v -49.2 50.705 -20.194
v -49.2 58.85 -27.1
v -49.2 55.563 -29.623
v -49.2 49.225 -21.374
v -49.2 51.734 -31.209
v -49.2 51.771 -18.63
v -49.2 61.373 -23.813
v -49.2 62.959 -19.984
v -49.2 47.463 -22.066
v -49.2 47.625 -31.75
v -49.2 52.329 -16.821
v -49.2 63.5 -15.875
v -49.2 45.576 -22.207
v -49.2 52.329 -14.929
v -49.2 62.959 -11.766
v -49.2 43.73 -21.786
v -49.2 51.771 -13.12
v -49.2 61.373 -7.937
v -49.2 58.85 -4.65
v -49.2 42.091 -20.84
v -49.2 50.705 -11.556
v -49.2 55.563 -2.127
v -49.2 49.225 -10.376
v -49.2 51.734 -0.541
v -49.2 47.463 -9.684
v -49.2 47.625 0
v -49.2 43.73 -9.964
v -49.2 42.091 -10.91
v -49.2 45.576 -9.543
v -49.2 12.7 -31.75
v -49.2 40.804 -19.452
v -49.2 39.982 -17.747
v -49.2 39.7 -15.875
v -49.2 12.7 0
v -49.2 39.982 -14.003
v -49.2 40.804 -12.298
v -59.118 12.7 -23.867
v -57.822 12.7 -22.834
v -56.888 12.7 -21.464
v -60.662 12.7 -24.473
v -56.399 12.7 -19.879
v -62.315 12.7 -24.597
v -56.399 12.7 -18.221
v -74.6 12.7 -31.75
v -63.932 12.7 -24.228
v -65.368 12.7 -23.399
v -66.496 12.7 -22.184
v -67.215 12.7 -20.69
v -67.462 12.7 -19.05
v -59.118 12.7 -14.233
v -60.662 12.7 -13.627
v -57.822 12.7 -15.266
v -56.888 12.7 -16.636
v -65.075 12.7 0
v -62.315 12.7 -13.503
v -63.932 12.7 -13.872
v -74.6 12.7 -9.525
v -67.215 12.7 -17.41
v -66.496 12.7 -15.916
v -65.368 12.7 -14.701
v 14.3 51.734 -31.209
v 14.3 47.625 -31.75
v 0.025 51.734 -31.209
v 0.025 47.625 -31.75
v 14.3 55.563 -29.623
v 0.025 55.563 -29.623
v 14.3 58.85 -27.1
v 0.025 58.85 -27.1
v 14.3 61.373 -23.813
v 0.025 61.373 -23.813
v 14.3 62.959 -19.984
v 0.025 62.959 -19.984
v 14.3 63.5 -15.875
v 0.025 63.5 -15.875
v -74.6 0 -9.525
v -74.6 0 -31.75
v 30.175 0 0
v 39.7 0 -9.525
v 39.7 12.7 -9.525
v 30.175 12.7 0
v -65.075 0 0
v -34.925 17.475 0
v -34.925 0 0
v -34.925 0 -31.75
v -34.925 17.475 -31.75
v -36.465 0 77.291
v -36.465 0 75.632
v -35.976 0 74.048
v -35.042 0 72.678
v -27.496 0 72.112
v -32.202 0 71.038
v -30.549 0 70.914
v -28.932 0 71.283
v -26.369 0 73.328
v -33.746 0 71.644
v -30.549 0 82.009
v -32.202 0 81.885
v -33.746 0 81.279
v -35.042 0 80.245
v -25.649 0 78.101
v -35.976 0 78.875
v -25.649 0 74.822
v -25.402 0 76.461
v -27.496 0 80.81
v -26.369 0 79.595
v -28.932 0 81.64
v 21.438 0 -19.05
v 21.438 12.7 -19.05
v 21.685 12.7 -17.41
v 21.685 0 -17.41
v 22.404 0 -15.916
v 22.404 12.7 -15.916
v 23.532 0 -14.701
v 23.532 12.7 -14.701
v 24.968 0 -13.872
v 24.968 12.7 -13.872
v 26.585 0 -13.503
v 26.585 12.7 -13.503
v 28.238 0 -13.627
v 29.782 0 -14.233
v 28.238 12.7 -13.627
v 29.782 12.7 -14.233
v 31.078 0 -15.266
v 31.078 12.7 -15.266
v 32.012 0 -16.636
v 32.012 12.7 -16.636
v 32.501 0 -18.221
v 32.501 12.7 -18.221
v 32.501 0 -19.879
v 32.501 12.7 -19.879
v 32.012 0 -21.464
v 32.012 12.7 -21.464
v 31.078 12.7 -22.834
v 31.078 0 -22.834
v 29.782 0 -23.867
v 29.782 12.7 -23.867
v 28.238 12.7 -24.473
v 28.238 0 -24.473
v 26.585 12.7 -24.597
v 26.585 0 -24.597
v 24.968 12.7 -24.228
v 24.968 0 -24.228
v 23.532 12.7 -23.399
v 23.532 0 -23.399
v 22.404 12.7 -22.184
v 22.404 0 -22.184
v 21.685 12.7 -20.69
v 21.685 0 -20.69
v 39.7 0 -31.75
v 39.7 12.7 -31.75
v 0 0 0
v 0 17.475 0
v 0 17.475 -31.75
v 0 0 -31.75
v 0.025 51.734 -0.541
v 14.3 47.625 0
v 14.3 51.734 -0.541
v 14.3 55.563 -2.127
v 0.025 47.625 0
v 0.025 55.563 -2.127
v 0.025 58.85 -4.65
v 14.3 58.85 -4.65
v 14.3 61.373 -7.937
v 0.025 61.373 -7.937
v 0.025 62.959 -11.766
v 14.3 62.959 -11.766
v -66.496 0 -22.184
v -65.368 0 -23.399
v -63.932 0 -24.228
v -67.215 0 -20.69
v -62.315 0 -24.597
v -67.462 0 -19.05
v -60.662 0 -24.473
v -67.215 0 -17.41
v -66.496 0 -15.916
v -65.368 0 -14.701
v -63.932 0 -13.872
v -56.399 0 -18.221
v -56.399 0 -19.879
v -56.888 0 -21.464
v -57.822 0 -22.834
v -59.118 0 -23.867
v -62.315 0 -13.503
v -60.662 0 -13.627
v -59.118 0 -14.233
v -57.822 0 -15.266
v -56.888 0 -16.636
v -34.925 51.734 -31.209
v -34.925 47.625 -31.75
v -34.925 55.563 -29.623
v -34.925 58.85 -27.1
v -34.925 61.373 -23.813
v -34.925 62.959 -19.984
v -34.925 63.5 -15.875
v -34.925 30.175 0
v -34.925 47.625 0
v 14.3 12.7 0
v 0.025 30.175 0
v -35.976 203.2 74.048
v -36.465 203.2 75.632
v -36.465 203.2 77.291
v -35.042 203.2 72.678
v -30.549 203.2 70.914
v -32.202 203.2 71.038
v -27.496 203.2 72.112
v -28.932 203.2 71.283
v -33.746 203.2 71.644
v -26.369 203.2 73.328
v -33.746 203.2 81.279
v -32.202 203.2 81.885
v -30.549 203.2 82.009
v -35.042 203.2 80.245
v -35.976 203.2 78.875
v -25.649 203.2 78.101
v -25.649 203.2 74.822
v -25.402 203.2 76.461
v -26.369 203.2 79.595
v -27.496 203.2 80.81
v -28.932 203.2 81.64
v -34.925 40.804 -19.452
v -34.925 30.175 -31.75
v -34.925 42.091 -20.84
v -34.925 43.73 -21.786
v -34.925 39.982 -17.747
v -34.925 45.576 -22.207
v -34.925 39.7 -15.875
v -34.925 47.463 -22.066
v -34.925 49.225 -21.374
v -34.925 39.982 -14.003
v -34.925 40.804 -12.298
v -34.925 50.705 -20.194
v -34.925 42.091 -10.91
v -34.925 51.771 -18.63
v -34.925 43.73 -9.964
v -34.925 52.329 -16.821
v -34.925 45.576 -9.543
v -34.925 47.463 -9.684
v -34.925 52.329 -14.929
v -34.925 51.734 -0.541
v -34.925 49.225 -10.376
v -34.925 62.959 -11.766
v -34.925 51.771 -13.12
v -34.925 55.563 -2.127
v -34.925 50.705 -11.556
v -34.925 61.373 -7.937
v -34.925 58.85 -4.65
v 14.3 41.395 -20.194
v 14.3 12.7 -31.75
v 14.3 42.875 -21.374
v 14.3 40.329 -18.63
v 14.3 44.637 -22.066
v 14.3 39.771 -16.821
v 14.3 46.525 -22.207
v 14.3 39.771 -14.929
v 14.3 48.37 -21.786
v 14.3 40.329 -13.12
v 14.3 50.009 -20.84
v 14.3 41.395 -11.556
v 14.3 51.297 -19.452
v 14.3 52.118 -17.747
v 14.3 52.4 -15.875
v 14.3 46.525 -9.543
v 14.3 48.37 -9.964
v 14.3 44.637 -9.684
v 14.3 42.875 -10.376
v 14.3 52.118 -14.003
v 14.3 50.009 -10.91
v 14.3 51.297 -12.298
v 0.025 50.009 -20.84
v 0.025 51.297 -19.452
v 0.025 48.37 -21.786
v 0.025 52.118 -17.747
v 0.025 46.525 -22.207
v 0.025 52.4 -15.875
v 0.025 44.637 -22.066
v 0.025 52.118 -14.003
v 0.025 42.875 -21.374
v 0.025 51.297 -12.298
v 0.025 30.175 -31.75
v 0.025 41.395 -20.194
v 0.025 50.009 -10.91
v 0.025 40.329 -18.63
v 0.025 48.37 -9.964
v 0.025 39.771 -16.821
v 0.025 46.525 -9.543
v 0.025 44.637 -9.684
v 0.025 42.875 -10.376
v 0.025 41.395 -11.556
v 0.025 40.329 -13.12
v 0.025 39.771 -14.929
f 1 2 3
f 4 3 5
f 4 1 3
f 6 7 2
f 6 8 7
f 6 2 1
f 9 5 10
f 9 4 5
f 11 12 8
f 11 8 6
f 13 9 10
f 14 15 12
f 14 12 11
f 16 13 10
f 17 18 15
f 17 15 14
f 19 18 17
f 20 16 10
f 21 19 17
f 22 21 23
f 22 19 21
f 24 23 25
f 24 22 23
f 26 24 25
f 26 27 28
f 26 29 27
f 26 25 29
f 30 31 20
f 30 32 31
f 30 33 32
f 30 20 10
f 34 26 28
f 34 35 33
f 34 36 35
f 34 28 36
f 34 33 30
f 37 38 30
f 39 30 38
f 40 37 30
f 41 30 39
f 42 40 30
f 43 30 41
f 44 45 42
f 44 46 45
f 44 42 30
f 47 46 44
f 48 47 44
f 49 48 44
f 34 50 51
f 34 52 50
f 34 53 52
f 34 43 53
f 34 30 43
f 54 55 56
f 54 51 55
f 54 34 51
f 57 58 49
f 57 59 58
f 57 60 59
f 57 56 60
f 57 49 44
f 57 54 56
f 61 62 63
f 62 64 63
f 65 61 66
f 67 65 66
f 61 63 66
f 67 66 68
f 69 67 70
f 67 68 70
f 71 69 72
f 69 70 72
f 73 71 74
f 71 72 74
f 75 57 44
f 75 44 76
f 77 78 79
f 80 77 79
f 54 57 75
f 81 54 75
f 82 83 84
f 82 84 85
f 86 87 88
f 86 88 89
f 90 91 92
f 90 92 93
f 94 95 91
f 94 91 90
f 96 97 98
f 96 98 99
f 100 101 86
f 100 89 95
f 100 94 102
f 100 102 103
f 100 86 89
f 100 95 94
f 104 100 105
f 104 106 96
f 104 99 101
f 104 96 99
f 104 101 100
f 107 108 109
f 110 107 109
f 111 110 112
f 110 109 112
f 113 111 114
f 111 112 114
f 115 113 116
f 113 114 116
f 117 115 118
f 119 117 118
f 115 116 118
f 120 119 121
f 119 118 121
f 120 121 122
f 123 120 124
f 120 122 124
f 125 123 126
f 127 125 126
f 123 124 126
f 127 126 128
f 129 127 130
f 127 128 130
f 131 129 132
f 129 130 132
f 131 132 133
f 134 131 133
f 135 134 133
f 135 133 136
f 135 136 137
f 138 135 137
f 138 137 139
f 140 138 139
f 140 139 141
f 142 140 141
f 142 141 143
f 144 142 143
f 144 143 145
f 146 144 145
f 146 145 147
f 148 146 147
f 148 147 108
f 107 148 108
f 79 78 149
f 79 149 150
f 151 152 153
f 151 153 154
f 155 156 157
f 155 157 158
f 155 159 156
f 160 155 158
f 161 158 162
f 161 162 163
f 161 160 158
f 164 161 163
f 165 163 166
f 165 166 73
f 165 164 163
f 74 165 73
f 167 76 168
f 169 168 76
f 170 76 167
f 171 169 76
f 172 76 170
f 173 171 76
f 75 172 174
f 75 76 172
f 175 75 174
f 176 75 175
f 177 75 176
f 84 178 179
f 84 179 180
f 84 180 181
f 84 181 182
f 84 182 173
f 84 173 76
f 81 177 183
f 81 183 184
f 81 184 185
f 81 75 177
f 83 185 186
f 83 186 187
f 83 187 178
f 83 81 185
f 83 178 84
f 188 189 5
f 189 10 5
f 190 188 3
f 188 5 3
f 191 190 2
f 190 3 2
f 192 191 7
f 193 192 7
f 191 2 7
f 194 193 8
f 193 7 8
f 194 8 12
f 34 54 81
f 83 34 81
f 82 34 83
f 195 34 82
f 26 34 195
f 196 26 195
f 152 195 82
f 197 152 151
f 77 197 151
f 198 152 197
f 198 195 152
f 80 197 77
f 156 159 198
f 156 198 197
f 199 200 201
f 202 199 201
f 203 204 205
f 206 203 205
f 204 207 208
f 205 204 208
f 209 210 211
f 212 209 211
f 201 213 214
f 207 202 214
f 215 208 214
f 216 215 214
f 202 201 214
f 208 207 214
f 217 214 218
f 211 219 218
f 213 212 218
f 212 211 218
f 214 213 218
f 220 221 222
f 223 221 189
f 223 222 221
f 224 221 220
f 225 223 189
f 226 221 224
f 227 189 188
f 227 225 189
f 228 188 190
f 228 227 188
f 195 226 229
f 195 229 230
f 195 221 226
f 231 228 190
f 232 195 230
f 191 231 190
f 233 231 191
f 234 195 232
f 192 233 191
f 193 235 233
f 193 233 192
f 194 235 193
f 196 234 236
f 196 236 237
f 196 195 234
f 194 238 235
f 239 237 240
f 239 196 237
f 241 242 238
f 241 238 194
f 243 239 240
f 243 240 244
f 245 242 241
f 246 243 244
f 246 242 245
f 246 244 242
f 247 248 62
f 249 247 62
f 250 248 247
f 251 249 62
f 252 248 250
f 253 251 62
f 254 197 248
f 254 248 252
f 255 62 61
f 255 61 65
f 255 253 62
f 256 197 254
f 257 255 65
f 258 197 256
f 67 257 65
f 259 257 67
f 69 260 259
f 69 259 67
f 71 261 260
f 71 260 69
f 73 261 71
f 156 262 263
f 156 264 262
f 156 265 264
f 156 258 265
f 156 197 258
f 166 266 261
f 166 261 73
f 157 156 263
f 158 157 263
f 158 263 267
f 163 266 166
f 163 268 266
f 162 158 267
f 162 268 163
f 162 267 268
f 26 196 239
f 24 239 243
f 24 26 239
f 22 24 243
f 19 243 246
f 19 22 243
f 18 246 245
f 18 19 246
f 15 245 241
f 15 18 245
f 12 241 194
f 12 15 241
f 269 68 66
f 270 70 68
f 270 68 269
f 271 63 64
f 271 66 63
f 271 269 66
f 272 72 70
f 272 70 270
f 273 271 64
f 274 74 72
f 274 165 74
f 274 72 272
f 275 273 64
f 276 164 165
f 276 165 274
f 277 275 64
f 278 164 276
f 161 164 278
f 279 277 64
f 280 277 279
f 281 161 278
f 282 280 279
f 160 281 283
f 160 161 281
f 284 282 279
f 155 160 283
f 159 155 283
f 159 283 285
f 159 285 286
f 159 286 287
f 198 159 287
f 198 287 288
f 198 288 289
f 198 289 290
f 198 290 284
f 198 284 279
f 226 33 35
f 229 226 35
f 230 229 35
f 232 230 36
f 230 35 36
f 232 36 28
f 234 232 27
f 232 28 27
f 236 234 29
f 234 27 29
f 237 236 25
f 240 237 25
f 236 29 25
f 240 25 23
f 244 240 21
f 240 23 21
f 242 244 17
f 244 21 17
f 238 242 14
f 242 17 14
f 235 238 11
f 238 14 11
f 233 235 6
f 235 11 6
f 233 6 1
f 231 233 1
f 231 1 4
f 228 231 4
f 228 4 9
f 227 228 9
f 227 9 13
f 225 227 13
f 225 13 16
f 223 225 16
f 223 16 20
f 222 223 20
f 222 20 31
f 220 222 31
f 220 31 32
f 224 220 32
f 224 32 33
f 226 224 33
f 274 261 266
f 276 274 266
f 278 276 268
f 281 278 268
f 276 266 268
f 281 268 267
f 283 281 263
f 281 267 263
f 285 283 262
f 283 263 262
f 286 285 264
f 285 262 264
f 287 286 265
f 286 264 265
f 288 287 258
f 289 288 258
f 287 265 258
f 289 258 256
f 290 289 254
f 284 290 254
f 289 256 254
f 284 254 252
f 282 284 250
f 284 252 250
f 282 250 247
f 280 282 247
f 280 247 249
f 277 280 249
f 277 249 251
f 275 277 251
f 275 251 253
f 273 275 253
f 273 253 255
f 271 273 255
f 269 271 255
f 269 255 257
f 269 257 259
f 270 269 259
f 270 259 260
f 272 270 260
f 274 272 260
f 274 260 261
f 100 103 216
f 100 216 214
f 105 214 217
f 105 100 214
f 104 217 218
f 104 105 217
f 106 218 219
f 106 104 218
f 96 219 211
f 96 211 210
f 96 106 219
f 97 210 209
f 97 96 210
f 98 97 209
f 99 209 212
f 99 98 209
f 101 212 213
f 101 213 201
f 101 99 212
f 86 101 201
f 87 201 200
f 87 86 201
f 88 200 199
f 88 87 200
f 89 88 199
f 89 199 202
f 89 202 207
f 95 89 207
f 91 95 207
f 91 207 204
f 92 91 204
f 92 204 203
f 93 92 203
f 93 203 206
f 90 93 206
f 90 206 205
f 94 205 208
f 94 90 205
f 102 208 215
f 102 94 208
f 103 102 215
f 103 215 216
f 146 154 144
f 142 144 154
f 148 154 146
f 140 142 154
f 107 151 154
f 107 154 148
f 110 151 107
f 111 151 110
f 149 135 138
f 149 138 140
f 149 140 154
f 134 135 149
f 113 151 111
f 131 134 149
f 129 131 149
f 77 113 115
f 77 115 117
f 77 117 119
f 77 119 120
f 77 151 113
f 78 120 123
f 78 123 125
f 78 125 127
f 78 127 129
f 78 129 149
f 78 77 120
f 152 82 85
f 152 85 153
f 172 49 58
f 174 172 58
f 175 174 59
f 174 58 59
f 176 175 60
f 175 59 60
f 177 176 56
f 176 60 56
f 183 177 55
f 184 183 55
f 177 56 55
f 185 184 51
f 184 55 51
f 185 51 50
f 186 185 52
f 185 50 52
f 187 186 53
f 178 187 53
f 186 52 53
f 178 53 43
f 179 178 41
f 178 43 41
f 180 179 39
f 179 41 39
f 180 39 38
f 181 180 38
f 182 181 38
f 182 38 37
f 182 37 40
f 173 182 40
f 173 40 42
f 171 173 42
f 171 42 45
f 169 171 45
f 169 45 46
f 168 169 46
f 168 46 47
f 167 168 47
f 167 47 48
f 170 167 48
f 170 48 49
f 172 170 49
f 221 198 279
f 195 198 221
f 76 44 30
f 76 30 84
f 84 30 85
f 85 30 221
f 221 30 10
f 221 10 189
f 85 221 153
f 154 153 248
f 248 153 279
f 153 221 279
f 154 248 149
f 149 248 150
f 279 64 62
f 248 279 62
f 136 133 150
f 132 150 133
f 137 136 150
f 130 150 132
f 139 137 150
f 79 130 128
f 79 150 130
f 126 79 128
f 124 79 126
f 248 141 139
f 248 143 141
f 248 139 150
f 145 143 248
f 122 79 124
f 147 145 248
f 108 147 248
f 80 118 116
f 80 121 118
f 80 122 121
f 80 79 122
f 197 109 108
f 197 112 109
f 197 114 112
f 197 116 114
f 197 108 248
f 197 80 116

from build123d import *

# Parameters (mm, degrees)
F1_DEPTH  = 31.75
F2_R      = 6.35
F3_DEPTH  = 25.4
F4_R      = 6.35
F5_DEPTH  = 25.4
F6_R      = 5.5626
F7_DEPTH  = 25.4
F8_SIZE   = 9.525
F9_R      = 15.87499
F10_R     = 5.5626
F11_DEPTH = 203.2


# Not quite as in the source:
# - a fillet or chamfer is up to 0.001 mm smaller than in the source, because OpenCascade refuses the exact size


with BuildPart() as f1:
    # F0 (on Top) → F1 (new body)
    with BuildSketch(Plane.XY):
        Polygon((0, 17.4752), (0, 0), (39.7002, 0), (39.7002, 12.7), (14.3002, 12.7), (14.3002, 63.5), (0.0254, 63.5), (0.0254, 30.1752), (-34.925, 30.1752), (-34.925, 63.5), (-49.1998, 63.5), (-49.1998, 12.7), (-74.5998, 12.7), (-74.5998, 0), (-34.925, 0), (-34.925, 17.4752), align=None)
    extrude(amount=-F1_DEPTH)

    # F2 (on face) → F3 (cut)
    with BuildSketch(Plane.YZ.offset(14.3002)):
        with Locations((46.0502, -15.875)):
            Circle(F2_R)
    extrude(amount=-F3_DEPTH, mode=Mode.SUBTRACT)

    # F4 (on face) → F5 (cut)
    with BuildSketch(Plane(origin=(-49.1998, 0, 0), x_dir=(0, -1, 0), z_dir=(-1, 0, 0))):
        with Locations((-46.0502, -15.875)):
            Circle(F4_R)
    extrude(amount=-F5_DEPTH, mode=Mode.SUBTRACT)

    # F6 (on face) → F7 (cut)
    with BuildSketch(Plane(origin=(0, 12.7, 0), x_dir=(-1, 0, 0), z_dir=(0, 1, 0))):
        with Locations((61.8998, -19.05)):
            Circle(F6_R)
        with Locations((-27.0002, -19.05)):
            Circle(F6_R)
    extrude(amount=-F7_DEPTH, mode=Mode.SUBTRACT)

    # F8
    f8_edges = [f1.edges().sort_by_distance(p)[0] for p in [
        (-74.5998, 6.35, 0),
        (39.7002, 6.35, 0),
    ]]
    chamfer(f8_edges, length=F8_SIZE)

    # F9 (radius 15.875 in the source; OpenCascade refuses exactly that, so slightly less here)
    f9_edges = [f1.edges().sort_by_distance(p)[0] for p in [
        (-42.0624, 63.5, 0),
        (-42.0624, 63.5, -31.75),
        (7.1628, 63.5, -31.75),
        (7.1628, 63.5, 0),
    ]]
    fillet(f9_edges, radius=F9_R)


with BuildPart() as f11:
    # F10 (on Front) → F11 (new body)
    with BuildSketch(Plane.XZ):
        with Locations((-30.9646371752, 76.4614716172)):
            Circle(F10_R)
    extrude(amount=-F11_DEPTH)


solid = Compound([f1.part, f11.part])
